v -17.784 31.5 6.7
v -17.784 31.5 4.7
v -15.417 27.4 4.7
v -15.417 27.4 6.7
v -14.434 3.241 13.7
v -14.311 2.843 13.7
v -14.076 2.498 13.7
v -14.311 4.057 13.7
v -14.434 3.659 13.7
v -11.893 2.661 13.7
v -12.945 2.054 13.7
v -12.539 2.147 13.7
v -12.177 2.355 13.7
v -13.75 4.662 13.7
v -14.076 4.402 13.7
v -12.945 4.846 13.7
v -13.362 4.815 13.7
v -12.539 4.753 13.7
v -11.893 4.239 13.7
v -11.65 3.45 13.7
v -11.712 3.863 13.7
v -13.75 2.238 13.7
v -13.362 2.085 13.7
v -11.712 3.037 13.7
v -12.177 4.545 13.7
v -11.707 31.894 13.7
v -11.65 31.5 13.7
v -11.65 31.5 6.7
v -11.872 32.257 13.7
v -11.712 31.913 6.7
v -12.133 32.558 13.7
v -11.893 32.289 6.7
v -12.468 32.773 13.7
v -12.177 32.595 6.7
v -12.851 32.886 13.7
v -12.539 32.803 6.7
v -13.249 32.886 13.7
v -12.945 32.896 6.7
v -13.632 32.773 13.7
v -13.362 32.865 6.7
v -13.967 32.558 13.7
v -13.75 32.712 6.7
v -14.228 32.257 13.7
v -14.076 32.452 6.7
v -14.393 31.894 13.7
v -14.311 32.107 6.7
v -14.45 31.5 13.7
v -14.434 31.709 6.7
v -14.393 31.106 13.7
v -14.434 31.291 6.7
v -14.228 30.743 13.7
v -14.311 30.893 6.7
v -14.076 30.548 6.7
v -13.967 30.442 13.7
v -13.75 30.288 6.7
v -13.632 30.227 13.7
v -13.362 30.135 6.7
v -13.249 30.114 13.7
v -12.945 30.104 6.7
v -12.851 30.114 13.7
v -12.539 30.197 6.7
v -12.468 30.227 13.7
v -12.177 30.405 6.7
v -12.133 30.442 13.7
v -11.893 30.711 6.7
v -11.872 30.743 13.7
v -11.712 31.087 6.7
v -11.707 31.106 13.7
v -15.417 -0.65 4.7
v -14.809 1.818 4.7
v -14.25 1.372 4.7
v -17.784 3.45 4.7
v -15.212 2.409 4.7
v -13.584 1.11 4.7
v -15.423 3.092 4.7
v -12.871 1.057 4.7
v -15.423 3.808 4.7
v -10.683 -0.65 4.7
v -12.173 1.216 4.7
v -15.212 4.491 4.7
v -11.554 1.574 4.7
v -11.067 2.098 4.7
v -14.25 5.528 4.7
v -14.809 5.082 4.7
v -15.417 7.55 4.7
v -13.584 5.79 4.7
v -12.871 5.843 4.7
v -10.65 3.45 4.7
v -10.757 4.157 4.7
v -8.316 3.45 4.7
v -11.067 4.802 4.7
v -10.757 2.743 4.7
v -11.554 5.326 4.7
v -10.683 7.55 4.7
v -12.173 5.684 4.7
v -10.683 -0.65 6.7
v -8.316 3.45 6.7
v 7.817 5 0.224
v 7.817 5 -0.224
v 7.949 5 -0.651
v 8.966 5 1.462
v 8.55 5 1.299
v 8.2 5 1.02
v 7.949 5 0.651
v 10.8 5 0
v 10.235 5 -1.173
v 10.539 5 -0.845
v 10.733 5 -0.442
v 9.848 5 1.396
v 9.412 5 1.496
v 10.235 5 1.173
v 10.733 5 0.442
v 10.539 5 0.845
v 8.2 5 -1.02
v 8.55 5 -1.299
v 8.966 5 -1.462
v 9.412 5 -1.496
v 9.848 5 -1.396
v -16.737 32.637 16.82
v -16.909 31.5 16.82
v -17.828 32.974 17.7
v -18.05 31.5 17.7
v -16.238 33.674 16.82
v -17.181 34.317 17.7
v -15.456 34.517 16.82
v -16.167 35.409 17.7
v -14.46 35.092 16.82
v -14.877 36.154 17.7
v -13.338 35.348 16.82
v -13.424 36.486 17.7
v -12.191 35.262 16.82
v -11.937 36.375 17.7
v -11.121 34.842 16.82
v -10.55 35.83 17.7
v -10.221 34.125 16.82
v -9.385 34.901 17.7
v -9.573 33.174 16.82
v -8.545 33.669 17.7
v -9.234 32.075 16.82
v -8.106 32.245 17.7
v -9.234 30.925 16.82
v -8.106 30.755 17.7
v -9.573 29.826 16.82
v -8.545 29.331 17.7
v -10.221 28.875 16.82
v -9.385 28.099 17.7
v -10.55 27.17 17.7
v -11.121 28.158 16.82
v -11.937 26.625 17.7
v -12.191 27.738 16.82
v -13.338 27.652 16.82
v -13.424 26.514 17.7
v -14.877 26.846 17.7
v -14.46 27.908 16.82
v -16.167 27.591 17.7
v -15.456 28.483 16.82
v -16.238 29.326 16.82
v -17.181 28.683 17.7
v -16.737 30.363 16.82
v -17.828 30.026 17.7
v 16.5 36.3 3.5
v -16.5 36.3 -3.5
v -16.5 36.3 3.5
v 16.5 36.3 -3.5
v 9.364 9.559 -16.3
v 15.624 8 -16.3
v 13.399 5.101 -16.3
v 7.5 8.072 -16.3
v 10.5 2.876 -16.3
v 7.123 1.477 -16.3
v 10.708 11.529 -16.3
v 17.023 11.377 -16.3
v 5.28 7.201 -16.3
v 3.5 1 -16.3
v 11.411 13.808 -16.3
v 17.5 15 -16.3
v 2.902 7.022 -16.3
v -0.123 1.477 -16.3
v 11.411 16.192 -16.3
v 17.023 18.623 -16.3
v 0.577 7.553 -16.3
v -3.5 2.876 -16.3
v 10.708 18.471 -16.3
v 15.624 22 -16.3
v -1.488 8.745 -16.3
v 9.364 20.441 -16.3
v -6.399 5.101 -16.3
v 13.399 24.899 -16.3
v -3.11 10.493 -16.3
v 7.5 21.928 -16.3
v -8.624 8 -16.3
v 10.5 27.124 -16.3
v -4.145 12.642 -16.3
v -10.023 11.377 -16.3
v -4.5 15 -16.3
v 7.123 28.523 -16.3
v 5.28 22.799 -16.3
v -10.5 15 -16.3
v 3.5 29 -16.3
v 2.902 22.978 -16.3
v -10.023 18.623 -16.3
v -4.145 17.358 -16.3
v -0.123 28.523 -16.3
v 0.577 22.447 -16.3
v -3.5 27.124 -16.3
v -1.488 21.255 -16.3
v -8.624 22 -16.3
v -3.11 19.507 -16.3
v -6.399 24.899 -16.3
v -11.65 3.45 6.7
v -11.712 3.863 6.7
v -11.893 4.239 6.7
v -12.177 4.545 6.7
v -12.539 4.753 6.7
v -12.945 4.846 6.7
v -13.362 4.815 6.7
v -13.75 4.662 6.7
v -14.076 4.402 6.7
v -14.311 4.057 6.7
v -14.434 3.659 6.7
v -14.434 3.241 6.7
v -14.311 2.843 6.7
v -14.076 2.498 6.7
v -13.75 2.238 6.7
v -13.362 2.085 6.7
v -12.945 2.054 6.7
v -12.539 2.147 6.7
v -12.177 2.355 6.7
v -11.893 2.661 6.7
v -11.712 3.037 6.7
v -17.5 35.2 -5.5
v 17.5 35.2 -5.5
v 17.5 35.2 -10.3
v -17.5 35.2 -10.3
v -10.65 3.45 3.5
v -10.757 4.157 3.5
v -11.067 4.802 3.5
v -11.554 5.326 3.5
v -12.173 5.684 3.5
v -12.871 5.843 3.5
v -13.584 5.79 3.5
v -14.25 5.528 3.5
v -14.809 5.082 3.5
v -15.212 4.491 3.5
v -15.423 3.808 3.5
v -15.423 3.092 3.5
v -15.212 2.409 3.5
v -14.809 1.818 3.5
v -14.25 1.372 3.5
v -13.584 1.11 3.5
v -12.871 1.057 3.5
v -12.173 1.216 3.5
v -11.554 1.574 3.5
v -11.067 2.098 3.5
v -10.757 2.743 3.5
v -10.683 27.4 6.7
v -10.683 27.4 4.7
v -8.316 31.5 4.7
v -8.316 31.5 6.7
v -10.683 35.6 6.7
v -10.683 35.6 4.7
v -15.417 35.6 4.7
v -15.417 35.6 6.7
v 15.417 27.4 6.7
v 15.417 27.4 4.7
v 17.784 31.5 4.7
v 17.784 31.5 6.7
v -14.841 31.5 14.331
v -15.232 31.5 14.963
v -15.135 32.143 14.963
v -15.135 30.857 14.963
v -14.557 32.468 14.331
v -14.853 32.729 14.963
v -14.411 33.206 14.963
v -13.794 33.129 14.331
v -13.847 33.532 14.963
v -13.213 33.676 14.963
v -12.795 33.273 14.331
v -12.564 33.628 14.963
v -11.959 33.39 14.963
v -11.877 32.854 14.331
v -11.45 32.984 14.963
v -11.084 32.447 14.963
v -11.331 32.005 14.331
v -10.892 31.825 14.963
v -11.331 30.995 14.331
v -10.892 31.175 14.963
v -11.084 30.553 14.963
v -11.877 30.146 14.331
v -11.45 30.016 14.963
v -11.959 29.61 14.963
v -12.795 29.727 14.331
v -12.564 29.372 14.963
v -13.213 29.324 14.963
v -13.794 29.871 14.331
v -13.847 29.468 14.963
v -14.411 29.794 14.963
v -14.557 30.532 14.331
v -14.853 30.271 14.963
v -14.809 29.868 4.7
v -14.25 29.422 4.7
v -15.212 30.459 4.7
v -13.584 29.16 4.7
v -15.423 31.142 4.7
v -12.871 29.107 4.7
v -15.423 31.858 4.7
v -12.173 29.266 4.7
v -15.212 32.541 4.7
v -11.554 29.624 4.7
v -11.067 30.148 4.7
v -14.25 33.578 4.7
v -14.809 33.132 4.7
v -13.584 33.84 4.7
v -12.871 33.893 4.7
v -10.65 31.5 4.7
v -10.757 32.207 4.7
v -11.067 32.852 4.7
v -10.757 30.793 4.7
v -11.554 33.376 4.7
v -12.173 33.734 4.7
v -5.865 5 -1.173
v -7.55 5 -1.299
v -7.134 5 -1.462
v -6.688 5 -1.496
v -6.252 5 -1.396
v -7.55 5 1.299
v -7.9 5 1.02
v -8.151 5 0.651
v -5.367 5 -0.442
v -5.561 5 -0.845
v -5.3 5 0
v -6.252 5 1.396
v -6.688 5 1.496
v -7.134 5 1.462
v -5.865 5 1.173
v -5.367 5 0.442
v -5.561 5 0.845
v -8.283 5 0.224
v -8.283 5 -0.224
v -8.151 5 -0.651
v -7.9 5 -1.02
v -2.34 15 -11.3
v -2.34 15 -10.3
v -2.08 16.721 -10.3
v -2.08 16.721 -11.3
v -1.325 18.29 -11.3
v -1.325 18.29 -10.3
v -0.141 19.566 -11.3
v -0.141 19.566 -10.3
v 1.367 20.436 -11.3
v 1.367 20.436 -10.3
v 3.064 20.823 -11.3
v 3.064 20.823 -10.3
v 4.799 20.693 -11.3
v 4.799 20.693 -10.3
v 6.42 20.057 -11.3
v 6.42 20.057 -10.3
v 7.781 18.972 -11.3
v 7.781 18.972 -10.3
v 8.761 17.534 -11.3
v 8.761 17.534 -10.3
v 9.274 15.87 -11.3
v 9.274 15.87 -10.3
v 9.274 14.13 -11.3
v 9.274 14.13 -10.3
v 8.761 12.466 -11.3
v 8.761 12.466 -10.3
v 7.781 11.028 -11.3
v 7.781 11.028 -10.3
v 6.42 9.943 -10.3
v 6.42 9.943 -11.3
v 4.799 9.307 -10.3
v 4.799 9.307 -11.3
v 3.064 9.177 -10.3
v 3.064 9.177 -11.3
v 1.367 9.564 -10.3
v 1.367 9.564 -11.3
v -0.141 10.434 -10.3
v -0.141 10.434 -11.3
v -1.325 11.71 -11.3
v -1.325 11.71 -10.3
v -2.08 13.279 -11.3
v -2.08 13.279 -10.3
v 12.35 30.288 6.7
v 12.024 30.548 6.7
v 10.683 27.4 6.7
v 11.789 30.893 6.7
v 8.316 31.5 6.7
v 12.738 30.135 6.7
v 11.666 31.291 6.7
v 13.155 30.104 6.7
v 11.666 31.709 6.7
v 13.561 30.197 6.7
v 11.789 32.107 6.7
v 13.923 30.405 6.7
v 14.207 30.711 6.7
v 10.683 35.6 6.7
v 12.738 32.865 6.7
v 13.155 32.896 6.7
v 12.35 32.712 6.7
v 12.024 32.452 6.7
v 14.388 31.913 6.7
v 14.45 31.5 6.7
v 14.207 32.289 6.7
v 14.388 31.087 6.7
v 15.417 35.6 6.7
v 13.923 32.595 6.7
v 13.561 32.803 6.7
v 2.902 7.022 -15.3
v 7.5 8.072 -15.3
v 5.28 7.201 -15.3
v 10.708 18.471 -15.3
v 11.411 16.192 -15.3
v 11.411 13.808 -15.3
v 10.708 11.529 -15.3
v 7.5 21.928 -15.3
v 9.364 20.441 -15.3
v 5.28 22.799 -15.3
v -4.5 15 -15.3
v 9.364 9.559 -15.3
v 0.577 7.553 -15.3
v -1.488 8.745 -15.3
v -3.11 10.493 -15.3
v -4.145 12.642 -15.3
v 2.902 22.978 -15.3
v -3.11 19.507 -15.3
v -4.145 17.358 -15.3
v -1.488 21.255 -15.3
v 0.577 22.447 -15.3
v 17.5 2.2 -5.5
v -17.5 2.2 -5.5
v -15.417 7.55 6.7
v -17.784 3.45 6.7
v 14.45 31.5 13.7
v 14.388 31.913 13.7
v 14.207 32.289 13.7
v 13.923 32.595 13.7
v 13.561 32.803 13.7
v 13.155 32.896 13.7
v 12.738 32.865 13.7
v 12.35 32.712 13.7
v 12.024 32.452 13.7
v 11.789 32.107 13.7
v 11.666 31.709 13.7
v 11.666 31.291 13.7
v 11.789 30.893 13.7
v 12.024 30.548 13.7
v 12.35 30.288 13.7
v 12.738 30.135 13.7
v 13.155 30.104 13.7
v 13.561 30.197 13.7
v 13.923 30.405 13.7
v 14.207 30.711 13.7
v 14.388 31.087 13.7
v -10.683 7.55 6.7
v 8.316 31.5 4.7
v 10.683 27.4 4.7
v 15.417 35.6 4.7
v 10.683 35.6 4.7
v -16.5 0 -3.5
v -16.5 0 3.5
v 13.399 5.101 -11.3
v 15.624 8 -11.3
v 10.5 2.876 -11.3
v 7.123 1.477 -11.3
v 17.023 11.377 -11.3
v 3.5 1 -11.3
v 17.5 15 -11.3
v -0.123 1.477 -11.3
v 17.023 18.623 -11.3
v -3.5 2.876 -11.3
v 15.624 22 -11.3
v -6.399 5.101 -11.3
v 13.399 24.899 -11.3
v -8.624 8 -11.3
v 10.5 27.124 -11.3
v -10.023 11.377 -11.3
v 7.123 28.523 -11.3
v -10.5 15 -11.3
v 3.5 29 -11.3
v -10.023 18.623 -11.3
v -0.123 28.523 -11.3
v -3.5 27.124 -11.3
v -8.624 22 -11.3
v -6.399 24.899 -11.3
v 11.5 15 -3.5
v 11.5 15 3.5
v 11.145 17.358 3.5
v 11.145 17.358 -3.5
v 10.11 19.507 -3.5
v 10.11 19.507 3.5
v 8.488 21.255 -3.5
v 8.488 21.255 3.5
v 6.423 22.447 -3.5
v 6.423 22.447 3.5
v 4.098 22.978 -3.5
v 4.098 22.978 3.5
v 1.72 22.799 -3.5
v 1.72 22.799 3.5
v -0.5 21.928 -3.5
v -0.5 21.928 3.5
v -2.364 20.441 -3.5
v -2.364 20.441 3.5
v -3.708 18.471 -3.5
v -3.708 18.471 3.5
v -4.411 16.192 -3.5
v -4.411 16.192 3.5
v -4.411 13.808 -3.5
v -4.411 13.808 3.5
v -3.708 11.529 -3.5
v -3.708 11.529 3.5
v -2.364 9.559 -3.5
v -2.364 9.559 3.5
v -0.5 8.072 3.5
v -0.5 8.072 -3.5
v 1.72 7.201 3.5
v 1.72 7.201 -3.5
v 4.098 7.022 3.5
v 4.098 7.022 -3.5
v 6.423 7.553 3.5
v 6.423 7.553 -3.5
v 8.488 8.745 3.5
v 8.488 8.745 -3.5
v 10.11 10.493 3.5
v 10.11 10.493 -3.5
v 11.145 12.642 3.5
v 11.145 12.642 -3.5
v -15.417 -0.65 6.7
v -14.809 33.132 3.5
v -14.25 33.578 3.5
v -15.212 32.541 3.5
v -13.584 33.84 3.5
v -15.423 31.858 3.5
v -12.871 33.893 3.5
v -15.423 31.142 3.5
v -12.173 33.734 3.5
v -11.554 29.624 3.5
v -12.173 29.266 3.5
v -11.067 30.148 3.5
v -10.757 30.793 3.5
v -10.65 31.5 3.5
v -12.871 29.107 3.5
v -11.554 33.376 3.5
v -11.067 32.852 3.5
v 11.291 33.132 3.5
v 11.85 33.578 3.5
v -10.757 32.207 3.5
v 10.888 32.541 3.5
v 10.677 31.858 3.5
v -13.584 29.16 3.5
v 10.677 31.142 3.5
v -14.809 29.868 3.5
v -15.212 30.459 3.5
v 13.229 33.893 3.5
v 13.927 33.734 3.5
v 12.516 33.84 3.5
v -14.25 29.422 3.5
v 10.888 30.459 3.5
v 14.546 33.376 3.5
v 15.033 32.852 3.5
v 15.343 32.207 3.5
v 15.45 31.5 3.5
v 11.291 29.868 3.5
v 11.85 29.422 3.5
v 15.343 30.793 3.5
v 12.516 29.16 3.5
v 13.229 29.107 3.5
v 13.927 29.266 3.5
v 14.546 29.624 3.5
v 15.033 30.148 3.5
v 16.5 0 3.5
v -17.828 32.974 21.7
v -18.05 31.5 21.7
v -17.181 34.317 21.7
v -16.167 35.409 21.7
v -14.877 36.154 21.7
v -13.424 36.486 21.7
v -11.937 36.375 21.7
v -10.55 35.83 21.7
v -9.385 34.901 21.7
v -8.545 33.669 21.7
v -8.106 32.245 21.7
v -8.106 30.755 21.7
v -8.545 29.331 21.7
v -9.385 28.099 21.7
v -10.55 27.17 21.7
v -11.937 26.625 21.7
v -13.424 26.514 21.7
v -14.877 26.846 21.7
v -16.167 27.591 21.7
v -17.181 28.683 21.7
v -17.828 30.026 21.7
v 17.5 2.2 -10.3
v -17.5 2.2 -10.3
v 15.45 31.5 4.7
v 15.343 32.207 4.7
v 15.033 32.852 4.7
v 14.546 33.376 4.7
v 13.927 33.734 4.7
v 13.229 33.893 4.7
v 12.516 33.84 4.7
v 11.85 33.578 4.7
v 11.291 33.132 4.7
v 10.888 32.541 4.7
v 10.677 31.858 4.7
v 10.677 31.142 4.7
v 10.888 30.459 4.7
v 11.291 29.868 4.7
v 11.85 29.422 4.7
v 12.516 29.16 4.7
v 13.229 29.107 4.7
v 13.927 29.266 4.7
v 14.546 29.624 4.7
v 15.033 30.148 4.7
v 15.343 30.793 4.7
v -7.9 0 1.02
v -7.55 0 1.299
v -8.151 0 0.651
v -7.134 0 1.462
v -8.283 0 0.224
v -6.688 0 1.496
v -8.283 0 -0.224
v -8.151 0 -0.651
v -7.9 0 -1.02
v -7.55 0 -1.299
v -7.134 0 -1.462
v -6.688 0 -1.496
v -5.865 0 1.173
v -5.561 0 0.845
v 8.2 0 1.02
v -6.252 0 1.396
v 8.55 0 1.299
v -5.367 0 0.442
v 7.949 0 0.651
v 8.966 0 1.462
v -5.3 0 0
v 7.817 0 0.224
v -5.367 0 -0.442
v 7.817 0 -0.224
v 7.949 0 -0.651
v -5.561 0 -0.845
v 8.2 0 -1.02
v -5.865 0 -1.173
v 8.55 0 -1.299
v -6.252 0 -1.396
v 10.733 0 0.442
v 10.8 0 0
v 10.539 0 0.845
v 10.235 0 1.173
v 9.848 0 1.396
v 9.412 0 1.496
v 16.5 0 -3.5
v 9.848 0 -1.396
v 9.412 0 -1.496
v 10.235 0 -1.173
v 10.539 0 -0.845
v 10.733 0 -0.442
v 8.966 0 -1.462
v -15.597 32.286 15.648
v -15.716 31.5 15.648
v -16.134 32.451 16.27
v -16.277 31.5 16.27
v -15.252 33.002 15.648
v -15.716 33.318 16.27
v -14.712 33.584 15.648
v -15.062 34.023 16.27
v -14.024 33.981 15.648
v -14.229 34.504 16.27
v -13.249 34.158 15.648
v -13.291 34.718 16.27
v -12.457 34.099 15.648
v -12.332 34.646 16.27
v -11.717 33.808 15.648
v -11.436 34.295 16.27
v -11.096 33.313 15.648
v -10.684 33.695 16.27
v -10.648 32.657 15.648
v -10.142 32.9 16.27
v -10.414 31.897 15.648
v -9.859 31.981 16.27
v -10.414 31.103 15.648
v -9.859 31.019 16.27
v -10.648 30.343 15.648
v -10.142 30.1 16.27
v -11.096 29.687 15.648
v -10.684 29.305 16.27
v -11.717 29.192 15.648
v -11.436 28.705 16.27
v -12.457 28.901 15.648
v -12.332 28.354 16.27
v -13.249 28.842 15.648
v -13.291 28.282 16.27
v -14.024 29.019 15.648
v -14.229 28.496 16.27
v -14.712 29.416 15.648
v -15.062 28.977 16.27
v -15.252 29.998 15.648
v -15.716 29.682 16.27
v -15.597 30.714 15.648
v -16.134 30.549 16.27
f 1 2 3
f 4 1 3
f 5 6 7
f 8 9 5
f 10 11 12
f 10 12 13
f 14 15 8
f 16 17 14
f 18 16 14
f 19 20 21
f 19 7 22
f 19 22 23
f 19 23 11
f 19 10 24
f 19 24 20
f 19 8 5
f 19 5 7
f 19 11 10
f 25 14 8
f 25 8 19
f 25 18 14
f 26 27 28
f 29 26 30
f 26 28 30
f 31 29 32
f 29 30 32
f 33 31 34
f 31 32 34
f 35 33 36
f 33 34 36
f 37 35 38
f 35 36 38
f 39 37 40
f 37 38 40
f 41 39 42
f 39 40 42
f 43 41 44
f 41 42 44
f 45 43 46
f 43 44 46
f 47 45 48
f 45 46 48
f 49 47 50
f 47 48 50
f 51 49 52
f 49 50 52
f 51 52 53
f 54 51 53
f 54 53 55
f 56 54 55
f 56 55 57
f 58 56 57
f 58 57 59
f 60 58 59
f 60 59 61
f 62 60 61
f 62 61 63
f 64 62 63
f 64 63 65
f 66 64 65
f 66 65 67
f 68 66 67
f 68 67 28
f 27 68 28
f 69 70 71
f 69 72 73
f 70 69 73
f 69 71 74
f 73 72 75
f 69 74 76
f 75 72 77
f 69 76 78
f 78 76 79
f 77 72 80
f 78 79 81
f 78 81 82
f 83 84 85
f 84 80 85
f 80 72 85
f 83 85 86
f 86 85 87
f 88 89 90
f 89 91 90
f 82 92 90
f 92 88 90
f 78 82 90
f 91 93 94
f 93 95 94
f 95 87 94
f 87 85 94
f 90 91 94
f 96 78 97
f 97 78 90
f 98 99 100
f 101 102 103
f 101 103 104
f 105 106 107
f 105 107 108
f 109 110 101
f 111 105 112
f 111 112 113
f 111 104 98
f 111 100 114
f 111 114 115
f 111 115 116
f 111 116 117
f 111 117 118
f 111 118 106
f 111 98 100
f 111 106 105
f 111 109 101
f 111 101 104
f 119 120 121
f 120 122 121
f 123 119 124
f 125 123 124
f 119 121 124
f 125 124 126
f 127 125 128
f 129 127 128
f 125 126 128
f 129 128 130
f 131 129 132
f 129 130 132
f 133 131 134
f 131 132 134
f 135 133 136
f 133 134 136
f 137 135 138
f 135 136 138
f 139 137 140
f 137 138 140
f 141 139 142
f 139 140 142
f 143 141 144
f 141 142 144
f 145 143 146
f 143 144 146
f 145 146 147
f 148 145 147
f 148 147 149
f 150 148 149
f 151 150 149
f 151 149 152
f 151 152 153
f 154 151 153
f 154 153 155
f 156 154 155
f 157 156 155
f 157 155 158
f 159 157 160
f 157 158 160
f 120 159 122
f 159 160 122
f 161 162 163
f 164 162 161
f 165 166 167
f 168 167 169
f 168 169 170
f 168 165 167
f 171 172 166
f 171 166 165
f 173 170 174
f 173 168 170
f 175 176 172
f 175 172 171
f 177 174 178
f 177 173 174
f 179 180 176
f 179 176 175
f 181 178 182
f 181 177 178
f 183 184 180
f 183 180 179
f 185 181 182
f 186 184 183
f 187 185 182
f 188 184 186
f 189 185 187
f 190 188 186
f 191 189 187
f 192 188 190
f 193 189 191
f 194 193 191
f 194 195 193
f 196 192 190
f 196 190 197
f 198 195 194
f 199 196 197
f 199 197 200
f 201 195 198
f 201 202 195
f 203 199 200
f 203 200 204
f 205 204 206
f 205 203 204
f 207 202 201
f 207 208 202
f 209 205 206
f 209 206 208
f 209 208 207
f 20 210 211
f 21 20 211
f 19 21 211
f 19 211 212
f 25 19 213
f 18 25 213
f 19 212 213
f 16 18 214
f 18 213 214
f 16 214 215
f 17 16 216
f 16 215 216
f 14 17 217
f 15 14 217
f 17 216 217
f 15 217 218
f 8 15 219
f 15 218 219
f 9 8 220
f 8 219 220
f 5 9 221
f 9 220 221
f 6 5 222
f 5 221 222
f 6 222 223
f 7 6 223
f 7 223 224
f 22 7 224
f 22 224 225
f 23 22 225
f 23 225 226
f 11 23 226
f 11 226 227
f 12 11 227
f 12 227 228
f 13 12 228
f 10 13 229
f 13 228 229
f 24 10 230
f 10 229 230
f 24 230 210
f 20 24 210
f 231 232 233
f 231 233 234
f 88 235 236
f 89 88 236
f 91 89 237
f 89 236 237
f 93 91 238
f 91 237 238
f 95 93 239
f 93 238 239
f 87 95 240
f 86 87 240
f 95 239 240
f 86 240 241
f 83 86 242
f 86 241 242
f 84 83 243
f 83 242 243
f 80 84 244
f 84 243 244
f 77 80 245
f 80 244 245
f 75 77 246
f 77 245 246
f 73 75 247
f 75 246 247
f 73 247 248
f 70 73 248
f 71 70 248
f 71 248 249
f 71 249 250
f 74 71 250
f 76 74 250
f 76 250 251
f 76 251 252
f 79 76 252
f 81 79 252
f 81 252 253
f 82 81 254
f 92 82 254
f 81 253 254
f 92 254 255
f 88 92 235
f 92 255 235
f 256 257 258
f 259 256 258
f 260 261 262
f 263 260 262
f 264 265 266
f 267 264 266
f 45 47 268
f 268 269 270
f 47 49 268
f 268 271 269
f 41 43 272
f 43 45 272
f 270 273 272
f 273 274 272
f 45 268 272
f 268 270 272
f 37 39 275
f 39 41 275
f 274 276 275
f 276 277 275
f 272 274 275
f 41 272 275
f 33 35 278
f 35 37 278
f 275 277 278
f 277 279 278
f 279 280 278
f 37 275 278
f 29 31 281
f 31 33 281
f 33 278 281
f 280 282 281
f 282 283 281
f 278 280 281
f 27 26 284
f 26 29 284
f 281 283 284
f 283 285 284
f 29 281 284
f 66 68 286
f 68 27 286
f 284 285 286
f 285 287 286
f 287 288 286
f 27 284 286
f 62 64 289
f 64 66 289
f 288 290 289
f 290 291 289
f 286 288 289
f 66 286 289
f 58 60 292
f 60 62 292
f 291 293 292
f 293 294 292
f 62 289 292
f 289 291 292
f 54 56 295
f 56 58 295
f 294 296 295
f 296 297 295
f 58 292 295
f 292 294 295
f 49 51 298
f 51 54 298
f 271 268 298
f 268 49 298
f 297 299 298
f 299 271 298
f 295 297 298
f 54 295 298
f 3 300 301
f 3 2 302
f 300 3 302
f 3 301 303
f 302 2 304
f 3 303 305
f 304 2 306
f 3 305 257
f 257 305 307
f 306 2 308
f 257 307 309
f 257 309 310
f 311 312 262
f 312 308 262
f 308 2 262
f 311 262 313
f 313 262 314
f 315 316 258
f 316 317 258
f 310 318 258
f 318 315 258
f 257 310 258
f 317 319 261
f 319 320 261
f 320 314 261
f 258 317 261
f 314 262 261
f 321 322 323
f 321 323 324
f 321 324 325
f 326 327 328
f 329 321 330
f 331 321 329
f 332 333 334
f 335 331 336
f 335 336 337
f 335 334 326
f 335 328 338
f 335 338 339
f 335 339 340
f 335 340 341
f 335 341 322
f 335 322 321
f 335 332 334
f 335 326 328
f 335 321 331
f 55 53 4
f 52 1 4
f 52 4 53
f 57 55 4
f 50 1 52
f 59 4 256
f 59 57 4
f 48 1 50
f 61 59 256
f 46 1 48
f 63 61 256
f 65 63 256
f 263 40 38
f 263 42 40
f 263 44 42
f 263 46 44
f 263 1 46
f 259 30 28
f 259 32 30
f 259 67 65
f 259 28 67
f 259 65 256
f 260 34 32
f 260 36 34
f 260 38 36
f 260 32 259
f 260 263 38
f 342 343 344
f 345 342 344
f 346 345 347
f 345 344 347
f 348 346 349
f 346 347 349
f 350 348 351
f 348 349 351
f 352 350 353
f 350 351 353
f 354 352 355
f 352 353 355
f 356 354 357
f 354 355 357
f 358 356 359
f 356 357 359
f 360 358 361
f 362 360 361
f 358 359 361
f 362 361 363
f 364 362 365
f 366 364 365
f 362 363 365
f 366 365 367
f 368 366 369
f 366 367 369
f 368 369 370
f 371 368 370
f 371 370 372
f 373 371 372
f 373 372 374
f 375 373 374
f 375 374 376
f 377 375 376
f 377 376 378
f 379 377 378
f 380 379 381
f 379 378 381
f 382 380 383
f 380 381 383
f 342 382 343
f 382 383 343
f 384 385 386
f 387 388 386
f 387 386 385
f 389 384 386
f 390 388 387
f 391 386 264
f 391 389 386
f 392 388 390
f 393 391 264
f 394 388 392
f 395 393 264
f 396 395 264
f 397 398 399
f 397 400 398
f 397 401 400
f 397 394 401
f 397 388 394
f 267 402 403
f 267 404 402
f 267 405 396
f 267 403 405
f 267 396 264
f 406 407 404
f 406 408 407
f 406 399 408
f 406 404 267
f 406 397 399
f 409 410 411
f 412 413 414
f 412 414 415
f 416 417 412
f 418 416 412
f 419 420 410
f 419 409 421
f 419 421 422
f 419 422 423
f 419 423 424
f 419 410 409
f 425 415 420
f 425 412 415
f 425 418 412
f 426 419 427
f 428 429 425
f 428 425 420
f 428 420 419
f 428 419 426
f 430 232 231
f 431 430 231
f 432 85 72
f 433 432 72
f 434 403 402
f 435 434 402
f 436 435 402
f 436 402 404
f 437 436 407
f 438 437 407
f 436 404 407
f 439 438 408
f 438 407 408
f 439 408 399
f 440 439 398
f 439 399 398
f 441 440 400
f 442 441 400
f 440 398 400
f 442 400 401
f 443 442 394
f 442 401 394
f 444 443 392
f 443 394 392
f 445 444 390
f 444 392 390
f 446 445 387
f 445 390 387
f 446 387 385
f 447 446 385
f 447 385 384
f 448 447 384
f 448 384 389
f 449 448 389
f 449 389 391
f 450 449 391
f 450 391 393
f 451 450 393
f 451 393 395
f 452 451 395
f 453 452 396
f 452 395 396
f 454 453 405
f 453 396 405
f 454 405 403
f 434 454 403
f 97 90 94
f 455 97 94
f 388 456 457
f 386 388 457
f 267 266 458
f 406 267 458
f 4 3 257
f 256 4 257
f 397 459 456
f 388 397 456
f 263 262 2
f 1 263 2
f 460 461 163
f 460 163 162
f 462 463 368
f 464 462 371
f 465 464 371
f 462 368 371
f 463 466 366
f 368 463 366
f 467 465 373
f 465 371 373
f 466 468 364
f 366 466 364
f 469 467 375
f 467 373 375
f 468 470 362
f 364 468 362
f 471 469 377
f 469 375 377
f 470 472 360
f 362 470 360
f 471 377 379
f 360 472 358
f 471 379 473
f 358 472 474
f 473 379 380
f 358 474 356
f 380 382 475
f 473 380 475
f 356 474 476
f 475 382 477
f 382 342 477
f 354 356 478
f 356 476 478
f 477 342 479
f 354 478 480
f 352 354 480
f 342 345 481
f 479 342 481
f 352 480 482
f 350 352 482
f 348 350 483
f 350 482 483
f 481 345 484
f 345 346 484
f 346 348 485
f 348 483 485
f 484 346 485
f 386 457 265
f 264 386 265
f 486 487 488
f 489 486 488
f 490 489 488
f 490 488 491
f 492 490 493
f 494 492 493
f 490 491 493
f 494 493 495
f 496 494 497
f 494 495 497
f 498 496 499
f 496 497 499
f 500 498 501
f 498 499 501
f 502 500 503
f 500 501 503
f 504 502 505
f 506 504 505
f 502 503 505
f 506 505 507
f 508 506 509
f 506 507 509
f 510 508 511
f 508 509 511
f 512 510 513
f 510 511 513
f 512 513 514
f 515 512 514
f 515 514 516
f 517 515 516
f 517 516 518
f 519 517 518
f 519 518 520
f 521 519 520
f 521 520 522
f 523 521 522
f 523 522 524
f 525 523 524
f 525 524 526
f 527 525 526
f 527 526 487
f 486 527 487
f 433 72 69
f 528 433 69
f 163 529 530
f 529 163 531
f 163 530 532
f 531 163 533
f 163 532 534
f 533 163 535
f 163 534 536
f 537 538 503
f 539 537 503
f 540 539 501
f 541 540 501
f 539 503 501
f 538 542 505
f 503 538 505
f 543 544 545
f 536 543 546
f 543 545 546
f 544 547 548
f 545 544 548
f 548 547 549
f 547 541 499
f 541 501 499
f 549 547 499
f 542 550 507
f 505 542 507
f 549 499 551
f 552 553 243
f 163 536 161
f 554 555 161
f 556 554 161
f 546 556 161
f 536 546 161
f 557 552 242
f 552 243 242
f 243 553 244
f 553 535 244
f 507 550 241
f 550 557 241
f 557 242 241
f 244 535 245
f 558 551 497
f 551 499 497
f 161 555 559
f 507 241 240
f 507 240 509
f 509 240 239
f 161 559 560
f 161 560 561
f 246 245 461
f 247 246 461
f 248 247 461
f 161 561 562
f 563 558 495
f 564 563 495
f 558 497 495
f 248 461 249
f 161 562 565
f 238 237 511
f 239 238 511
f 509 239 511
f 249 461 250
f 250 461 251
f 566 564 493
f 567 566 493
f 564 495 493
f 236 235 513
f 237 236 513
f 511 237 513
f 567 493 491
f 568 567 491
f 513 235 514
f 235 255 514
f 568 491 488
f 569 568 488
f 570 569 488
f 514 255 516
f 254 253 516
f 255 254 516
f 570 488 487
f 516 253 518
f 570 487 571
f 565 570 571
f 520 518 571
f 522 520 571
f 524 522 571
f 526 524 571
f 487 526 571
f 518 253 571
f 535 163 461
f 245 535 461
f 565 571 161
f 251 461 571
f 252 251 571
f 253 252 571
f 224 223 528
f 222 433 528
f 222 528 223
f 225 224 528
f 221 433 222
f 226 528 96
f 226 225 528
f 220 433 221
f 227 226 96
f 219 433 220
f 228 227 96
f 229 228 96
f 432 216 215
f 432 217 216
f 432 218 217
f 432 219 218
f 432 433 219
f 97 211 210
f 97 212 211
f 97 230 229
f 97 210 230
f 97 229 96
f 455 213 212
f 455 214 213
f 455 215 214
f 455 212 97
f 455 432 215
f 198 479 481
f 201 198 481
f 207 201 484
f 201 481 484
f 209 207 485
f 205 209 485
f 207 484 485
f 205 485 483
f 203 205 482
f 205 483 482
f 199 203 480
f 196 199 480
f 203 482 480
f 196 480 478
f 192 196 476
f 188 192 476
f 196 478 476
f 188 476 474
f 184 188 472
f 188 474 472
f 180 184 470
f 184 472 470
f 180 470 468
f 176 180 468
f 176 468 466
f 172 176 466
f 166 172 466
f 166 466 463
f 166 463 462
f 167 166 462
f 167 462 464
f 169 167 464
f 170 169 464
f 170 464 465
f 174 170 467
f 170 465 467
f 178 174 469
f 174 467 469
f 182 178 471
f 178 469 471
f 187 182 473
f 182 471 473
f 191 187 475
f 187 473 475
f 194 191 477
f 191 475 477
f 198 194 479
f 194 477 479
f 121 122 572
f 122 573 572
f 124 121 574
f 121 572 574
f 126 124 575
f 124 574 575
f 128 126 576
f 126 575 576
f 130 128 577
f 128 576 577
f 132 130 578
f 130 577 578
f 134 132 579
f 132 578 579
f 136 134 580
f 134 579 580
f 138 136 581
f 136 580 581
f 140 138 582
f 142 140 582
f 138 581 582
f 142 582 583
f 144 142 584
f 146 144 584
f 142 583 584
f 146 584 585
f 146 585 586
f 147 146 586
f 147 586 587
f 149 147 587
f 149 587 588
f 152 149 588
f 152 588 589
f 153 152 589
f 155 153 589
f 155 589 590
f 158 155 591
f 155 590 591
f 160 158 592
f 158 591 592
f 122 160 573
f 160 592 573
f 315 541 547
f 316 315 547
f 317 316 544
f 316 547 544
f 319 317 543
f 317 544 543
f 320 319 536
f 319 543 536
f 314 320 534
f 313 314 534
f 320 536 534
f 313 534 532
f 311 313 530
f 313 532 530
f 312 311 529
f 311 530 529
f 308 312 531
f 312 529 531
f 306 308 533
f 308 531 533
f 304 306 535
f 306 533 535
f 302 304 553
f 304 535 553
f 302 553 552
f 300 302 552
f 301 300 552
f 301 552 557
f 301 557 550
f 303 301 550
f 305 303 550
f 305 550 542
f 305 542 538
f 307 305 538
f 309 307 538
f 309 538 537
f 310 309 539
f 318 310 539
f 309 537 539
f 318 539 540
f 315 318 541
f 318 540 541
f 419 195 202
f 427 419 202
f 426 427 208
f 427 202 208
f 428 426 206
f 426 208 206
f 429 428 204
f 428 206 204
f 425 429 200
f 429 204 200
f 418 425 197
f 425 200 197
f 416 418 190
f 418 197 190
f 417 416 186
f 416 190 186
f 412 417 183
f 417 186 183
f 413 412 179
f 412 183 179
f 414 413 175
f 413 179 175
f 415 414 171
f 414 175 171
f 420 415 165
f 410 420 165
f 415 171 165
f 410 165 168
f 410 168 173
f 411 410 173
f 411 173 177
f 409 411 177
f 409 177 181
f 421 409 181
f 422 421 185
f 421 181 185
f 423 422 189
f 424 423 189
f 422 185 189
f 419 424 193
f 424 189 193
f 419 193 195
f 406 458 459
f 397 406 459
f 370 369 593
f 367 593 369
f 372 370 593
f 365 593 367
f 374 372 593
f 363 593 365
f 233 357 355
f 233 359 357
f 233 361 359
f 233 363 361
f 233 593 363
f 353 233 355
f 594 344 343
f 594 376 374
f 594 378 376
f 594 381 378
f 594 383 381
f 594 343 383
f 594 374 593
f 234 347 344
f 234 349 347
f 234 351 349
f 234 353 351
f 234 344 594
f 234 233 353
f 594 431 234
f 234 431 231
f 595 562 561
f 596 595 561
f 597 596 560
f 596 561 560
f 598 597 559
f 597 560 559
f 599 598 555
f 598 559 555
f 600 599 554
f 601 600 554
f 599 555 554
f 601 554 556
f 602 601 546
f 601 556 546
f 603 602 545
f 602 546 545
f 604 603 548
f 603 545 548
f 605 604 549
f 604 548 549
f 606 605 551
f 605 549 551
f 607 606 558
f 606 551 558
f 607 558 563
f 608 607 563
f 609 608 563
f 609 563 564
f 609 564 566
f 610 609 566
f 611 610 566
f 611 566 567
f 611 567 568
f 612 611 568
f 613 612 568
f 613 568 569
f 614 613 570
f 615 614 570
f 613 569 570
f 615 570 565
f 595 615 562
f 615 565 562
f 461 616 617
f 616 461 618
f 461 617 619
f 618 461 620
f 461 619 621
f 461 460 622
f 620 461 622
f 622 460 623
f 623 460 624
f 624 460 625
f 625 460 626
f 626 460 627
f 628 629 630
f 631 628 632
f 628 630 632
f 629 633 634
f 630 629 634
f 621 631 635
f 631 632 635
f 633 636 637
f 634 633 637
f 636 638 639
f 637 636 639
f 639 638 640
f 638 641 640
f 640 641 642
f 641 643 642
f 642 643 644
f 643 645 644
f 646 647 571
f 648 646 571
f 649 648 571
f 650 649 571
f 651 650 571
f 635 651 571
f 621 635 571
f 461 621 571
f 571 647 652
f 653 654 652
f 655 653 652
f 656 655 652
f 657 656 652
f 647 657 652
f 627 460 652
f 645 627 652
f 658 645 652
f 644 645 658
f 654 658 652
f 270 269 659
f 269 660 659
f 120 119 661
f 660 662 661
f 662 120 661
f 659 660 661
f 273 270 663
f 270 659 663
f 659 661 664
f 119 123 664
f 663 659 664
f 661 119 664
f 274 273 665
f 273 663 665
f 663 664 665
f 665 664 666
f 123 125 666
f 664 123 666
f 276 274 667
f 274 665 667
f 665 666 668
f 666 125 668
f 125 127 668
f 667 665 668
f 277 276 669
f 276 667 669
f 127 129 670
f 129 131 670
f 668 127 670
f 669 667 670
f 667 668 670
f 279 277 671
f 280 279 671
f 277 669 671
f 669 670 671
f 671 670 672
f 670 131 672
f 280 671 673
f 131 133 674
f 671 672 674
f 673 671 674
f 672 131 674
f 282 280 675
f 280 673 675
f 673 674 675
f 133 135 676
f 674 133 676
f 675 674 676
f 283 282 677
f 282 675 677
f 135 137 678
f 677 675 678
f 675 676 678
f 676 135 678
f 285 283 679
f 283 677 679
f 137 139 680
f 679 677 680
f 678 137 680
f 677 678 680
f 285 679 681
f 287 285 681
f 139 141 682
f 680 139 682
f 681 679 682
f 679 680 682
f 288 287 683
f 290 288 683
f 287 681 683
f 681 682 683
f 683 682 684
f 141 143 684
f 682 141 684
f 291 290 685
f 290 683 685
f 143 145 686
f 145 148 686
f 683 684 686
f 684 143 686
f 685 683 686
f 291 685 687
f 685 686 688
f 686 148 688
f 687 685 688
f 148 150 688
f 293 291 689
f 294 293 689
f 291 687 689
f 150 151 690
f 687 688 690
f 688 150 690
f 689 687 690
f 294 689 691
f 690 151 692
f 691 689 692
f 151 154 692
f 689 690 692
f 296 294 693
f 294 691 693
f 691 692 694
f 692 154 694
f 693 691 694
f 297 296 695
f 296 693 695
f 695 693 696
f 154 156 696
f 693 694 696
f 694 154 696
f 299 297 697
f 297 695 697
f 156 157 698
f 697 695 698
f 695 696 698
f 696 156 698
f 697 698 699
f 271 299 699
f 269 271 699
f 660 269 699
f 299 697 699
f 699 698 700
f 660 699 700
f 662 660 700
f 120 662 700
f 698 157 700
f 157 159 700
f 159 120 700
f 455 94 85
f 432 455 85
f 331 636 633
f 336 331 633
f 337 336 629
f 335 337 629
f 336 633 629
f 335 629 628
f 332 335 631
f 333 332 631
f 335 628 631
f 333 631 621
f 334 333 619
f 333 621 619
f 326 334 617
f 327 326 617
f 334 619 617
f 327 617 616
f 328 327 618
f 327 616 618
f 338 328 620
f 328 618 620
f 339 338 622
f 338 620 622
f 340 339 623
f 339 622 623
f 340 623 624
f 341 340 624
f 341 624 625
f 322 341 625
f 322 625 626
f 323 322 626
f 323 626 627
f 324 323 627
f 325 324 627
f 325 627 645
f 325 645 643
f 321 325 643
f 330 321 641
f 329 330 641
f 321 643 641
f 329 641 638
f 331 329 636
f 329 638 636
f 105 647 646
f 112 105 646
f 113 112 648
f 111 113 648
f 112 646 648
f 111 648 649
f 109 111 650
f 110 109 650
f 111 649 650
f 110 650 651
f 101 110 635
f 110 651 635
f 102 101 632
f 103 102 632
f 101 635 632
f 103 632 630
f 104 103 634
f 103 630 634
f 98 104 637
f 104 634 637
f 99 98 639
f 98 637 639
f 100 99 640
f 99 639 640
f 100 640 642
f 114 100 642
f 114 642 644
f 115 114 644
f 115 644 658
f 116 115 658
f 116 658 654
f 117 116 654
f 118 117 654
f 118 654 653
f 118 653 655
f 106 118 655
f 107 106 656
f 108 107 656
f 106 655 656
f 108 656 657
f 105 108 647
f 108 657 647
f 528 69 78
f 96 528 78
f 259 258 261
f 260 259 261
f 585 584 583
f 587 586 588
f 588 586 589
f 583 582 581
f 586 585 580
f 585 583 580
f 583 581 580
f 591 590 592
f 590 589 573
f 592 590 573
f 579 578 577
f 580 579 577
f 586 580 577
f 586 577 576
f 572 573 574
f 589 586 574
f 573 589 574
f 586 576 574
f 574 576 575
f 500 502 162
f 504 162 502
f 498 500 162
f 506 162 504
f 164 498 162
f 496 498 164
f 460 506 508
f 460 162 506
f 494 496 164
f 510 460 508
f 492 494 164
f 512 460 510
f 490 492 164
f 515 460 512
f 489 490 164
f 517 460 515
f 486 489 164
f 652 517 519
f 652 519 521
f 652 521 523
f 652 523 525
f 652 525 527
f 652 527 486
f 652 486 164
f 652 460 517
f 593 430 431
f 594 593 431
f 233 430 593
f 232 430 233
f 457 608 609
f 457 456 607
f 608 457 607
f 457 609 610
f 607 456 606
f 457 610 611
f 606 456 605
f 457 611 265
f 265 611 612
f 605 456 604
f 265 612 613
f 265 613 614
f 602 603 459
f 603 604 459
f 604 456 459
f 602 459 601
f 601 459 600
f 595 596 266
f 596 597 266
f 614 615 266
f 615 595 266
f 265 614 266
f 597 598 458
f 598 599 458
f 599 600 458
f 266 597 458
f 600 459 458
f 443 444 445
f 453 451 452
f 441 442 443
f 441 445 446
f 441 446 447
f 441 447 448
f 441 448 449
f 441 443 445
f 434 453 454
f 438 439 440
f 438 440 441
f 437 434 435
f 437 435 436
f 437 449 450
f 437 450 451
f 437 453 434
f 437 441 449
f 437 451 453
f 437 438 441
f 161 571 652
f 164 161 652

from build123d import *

# Parameters (mm, degrees)
CROQUIS1_W              = 33
CROQUIS1_H              = 7
SALIENTE_EXTRUIR1_DEPTH = 36.3
CROQUIS2_R              = 1.5
CORTAR_EXTRUIR1_DEPTH   = 5
CROQUIS3_R              = 8
CORTAR_EXTRUIR2_DEPTH   = 8
CROQUIS4_R              = 2.4
SALIENTE_EXTRUIR2_DEPTH = 1.2
SALIENTE_EXTRUIR3_DEPTH = 2
CROQUIS6_R              = 1.4
SALIENTE_EXTRUIR4_DEPTH = 7
CROQUIS9_W              = 35
CROQUIS9_H              = 33
SALIENTE_EXTRUIR5_DEPTH = 4.8
CROQUIS10_R             = 5.839659477
SALIENTE_EXTRUIR6_DEPTH = 1
CROQUIS11_R             = 14
SALIENTE_EXTRUIR7_DEPTH = 5
CROQUIS12_R             = 8
CORTAR_EXTRUIR3_DEPTH   = 1


with BuildPart() as part:
    # Croquis1 → Saliente-Extruir1 (new body)
    with BuildSketch(Plane(origin=(0, 0, 0), x_dir=(1, 0, 0), z_dir=(0, 1, 0))):
        Rectangle(CROQUIS1_W, CROQUIS1_H)
    extrude(amount=SALIENTE_EXTRUIR1_DEPTH)

    # Croquis2 → Cortar-Extruir1 (cut)
    with BuildSketch(Plane.XZ):
        with Locations((-6.8, 0)):
            Circle(CROQUIS2_R)
        with Locations((9.3, 0)):
            Circle(CROQUIS2_R)
    extrude(amount=-CORTAR_EXTRUIR1_DEPTH, mode=Mode.SUBTRACT)

    # Croquis3 → Cortar-Extruir2 (cut, through all)
    with BuildSketch(Plane.XY.offset(3.5)):
        with Locations((3.5, 15)):
            Circle(CROQUIS3_R)
    extrude(amount=-CORTAR_EXTRUIR2_DEPTH, mode=Mode.SUBTRACT)

    # Croquis4 → Saliente-Extruir2 (add)
    with BuildSketch(Plane.XY.offset(3.5)):
        with Locations((-13.05, 31.5)):
            Circle(CROQUIS4_R)
        with Locations((13.05, 31.5)):
            Circle(CROQUIS4_R)
        with Locations((-13.05, 3.45)):
            Circle(CROQUIS4_R)
    extrude(amount=SALIENTE_EXTRUIR2_DEPTH)

    # Croquis5 → Saliente-Extruir3 (add)
    with BuildSketch(Plane.XY.offset(4.7)):
        Polygon((-17.784272207, 31.5), (-15.417136104, 27.4), (-10.682863896, 27.4), (-8.315727793, 31.5), (-10.682863896, 35.6), (-15.417136104, 35.6), align=None)
        Polygon((17.784272207, 31.5), (15.417136104, 35.6), (10.682863896, 35.6), (8.315727793, 31.5), (10.682863896, 27.4), (15.417136104, 27.4), align=None)
        Polygon((-8.315727793, 3.45), (-10.682863896, 7.55), (-15.417136104, 7.55), (-17.784272207, 3.45), (-15.417136104, -0.65), (-10.682863896, -0.65), align=None)
    extrude(amount=SALIENTE_EXTRUIR3_DEPTH)

    # Croquis6 → Saliente-Extruir4 (add)
    with BuildSketch(Plane.XY.offset(6.7)):
        with Locations((-13.05, 31.5)):
            Circle(CROQUIS6_R)
        with Locations((13.05, 31.5)):
            Circle(CROQUIS6_R)
        with Locations((-13.05, 3.45)):
            Circle(CROQUIS6_R)
    extrude(amount=SALIENTE_EXTRUIR4_DEPTH)

    # Croquis8 → Revolución1 (revolve)
    with BuildSketch(Plane.XZ.offset(-31.5)):
        with BuildLine():
            Line((-14.45, 13.7), (-15.232399286, 14.962983287))
            ThreePointArc((-15.232399286, 14.962983287), (-15.987008603, 15.967113671), (-16.908922521, 16.820218458))
            Line((-16.908922521, 16.820218458), (-18.05, 17.7))
            Line((-18.05, 17.7), (-18.05, 21.7))
            Line((-18.05, 21.7), (-13.05, 21.7))
            Line((-13.05, 21.7), (-13.05, 13.7))
            Line((-13.05, 13.7), (-14.45, 13.7))
        make_face()
    revolve(axis=Axis((-13.05, 31.5, 21.7), (0, 0, -1)))


with BuildPart() as body_2:
    # Croquis9 → Saliente-Extruir5 (new body)
    with BuildSketch(Plane(origin=(0, 0, -5.5), x_dir=(-1, 0, 0), z_dir=(0, 0, -1))):
        with Locations((0, 18.7)):
            Rectangle(CROQUIS9_W, CROQUIS9_H)
    extrude(amount=SALIENTE_EXTRUIR5_DEPTH)

    # Croquis10 → Saliente-Extruir6 (add)
    with BuildSketch(Plane(origin=(0, 0, -10.3), x_dir=(-1, 0, 0), z_dir=(0, 0, -1))):
        with Locations((-3.5, 15)):
            Circle(CROQUIS10_R)
    extrude(amount=SALIENTE_EXTRUIR6_DEPTH)

    # Croquis11 → Saliente-Extruir7 (add)
    with BuildSketch(Plane(origin=(0, 0, -11.3), x_dir=(-1, 0, 0), z_dir=(0, 0, -1))):
        with Locations((-3.5, 15)):
            Circle(CROQUIS11_R)
    extrude(amount=SALIENTE_EXTRUIR7_DEPTH)

    # Croquis12 → Cortar-Extruir3 (cut)
    with BuildSketch(Plane(origin=(0, 0, -16.3), x_dir=(-1, 0, 0), z_dir=(0, 0, -1))):
        with Locations((-3.5, 15)):
            Circle(CROQUIS12_R)
    extrude(amount=-CORTAR_EXTRUIR3_DEPTH, mode=Mode.SUBTRACT)


solid = Compound([part.part, body_2.part])
